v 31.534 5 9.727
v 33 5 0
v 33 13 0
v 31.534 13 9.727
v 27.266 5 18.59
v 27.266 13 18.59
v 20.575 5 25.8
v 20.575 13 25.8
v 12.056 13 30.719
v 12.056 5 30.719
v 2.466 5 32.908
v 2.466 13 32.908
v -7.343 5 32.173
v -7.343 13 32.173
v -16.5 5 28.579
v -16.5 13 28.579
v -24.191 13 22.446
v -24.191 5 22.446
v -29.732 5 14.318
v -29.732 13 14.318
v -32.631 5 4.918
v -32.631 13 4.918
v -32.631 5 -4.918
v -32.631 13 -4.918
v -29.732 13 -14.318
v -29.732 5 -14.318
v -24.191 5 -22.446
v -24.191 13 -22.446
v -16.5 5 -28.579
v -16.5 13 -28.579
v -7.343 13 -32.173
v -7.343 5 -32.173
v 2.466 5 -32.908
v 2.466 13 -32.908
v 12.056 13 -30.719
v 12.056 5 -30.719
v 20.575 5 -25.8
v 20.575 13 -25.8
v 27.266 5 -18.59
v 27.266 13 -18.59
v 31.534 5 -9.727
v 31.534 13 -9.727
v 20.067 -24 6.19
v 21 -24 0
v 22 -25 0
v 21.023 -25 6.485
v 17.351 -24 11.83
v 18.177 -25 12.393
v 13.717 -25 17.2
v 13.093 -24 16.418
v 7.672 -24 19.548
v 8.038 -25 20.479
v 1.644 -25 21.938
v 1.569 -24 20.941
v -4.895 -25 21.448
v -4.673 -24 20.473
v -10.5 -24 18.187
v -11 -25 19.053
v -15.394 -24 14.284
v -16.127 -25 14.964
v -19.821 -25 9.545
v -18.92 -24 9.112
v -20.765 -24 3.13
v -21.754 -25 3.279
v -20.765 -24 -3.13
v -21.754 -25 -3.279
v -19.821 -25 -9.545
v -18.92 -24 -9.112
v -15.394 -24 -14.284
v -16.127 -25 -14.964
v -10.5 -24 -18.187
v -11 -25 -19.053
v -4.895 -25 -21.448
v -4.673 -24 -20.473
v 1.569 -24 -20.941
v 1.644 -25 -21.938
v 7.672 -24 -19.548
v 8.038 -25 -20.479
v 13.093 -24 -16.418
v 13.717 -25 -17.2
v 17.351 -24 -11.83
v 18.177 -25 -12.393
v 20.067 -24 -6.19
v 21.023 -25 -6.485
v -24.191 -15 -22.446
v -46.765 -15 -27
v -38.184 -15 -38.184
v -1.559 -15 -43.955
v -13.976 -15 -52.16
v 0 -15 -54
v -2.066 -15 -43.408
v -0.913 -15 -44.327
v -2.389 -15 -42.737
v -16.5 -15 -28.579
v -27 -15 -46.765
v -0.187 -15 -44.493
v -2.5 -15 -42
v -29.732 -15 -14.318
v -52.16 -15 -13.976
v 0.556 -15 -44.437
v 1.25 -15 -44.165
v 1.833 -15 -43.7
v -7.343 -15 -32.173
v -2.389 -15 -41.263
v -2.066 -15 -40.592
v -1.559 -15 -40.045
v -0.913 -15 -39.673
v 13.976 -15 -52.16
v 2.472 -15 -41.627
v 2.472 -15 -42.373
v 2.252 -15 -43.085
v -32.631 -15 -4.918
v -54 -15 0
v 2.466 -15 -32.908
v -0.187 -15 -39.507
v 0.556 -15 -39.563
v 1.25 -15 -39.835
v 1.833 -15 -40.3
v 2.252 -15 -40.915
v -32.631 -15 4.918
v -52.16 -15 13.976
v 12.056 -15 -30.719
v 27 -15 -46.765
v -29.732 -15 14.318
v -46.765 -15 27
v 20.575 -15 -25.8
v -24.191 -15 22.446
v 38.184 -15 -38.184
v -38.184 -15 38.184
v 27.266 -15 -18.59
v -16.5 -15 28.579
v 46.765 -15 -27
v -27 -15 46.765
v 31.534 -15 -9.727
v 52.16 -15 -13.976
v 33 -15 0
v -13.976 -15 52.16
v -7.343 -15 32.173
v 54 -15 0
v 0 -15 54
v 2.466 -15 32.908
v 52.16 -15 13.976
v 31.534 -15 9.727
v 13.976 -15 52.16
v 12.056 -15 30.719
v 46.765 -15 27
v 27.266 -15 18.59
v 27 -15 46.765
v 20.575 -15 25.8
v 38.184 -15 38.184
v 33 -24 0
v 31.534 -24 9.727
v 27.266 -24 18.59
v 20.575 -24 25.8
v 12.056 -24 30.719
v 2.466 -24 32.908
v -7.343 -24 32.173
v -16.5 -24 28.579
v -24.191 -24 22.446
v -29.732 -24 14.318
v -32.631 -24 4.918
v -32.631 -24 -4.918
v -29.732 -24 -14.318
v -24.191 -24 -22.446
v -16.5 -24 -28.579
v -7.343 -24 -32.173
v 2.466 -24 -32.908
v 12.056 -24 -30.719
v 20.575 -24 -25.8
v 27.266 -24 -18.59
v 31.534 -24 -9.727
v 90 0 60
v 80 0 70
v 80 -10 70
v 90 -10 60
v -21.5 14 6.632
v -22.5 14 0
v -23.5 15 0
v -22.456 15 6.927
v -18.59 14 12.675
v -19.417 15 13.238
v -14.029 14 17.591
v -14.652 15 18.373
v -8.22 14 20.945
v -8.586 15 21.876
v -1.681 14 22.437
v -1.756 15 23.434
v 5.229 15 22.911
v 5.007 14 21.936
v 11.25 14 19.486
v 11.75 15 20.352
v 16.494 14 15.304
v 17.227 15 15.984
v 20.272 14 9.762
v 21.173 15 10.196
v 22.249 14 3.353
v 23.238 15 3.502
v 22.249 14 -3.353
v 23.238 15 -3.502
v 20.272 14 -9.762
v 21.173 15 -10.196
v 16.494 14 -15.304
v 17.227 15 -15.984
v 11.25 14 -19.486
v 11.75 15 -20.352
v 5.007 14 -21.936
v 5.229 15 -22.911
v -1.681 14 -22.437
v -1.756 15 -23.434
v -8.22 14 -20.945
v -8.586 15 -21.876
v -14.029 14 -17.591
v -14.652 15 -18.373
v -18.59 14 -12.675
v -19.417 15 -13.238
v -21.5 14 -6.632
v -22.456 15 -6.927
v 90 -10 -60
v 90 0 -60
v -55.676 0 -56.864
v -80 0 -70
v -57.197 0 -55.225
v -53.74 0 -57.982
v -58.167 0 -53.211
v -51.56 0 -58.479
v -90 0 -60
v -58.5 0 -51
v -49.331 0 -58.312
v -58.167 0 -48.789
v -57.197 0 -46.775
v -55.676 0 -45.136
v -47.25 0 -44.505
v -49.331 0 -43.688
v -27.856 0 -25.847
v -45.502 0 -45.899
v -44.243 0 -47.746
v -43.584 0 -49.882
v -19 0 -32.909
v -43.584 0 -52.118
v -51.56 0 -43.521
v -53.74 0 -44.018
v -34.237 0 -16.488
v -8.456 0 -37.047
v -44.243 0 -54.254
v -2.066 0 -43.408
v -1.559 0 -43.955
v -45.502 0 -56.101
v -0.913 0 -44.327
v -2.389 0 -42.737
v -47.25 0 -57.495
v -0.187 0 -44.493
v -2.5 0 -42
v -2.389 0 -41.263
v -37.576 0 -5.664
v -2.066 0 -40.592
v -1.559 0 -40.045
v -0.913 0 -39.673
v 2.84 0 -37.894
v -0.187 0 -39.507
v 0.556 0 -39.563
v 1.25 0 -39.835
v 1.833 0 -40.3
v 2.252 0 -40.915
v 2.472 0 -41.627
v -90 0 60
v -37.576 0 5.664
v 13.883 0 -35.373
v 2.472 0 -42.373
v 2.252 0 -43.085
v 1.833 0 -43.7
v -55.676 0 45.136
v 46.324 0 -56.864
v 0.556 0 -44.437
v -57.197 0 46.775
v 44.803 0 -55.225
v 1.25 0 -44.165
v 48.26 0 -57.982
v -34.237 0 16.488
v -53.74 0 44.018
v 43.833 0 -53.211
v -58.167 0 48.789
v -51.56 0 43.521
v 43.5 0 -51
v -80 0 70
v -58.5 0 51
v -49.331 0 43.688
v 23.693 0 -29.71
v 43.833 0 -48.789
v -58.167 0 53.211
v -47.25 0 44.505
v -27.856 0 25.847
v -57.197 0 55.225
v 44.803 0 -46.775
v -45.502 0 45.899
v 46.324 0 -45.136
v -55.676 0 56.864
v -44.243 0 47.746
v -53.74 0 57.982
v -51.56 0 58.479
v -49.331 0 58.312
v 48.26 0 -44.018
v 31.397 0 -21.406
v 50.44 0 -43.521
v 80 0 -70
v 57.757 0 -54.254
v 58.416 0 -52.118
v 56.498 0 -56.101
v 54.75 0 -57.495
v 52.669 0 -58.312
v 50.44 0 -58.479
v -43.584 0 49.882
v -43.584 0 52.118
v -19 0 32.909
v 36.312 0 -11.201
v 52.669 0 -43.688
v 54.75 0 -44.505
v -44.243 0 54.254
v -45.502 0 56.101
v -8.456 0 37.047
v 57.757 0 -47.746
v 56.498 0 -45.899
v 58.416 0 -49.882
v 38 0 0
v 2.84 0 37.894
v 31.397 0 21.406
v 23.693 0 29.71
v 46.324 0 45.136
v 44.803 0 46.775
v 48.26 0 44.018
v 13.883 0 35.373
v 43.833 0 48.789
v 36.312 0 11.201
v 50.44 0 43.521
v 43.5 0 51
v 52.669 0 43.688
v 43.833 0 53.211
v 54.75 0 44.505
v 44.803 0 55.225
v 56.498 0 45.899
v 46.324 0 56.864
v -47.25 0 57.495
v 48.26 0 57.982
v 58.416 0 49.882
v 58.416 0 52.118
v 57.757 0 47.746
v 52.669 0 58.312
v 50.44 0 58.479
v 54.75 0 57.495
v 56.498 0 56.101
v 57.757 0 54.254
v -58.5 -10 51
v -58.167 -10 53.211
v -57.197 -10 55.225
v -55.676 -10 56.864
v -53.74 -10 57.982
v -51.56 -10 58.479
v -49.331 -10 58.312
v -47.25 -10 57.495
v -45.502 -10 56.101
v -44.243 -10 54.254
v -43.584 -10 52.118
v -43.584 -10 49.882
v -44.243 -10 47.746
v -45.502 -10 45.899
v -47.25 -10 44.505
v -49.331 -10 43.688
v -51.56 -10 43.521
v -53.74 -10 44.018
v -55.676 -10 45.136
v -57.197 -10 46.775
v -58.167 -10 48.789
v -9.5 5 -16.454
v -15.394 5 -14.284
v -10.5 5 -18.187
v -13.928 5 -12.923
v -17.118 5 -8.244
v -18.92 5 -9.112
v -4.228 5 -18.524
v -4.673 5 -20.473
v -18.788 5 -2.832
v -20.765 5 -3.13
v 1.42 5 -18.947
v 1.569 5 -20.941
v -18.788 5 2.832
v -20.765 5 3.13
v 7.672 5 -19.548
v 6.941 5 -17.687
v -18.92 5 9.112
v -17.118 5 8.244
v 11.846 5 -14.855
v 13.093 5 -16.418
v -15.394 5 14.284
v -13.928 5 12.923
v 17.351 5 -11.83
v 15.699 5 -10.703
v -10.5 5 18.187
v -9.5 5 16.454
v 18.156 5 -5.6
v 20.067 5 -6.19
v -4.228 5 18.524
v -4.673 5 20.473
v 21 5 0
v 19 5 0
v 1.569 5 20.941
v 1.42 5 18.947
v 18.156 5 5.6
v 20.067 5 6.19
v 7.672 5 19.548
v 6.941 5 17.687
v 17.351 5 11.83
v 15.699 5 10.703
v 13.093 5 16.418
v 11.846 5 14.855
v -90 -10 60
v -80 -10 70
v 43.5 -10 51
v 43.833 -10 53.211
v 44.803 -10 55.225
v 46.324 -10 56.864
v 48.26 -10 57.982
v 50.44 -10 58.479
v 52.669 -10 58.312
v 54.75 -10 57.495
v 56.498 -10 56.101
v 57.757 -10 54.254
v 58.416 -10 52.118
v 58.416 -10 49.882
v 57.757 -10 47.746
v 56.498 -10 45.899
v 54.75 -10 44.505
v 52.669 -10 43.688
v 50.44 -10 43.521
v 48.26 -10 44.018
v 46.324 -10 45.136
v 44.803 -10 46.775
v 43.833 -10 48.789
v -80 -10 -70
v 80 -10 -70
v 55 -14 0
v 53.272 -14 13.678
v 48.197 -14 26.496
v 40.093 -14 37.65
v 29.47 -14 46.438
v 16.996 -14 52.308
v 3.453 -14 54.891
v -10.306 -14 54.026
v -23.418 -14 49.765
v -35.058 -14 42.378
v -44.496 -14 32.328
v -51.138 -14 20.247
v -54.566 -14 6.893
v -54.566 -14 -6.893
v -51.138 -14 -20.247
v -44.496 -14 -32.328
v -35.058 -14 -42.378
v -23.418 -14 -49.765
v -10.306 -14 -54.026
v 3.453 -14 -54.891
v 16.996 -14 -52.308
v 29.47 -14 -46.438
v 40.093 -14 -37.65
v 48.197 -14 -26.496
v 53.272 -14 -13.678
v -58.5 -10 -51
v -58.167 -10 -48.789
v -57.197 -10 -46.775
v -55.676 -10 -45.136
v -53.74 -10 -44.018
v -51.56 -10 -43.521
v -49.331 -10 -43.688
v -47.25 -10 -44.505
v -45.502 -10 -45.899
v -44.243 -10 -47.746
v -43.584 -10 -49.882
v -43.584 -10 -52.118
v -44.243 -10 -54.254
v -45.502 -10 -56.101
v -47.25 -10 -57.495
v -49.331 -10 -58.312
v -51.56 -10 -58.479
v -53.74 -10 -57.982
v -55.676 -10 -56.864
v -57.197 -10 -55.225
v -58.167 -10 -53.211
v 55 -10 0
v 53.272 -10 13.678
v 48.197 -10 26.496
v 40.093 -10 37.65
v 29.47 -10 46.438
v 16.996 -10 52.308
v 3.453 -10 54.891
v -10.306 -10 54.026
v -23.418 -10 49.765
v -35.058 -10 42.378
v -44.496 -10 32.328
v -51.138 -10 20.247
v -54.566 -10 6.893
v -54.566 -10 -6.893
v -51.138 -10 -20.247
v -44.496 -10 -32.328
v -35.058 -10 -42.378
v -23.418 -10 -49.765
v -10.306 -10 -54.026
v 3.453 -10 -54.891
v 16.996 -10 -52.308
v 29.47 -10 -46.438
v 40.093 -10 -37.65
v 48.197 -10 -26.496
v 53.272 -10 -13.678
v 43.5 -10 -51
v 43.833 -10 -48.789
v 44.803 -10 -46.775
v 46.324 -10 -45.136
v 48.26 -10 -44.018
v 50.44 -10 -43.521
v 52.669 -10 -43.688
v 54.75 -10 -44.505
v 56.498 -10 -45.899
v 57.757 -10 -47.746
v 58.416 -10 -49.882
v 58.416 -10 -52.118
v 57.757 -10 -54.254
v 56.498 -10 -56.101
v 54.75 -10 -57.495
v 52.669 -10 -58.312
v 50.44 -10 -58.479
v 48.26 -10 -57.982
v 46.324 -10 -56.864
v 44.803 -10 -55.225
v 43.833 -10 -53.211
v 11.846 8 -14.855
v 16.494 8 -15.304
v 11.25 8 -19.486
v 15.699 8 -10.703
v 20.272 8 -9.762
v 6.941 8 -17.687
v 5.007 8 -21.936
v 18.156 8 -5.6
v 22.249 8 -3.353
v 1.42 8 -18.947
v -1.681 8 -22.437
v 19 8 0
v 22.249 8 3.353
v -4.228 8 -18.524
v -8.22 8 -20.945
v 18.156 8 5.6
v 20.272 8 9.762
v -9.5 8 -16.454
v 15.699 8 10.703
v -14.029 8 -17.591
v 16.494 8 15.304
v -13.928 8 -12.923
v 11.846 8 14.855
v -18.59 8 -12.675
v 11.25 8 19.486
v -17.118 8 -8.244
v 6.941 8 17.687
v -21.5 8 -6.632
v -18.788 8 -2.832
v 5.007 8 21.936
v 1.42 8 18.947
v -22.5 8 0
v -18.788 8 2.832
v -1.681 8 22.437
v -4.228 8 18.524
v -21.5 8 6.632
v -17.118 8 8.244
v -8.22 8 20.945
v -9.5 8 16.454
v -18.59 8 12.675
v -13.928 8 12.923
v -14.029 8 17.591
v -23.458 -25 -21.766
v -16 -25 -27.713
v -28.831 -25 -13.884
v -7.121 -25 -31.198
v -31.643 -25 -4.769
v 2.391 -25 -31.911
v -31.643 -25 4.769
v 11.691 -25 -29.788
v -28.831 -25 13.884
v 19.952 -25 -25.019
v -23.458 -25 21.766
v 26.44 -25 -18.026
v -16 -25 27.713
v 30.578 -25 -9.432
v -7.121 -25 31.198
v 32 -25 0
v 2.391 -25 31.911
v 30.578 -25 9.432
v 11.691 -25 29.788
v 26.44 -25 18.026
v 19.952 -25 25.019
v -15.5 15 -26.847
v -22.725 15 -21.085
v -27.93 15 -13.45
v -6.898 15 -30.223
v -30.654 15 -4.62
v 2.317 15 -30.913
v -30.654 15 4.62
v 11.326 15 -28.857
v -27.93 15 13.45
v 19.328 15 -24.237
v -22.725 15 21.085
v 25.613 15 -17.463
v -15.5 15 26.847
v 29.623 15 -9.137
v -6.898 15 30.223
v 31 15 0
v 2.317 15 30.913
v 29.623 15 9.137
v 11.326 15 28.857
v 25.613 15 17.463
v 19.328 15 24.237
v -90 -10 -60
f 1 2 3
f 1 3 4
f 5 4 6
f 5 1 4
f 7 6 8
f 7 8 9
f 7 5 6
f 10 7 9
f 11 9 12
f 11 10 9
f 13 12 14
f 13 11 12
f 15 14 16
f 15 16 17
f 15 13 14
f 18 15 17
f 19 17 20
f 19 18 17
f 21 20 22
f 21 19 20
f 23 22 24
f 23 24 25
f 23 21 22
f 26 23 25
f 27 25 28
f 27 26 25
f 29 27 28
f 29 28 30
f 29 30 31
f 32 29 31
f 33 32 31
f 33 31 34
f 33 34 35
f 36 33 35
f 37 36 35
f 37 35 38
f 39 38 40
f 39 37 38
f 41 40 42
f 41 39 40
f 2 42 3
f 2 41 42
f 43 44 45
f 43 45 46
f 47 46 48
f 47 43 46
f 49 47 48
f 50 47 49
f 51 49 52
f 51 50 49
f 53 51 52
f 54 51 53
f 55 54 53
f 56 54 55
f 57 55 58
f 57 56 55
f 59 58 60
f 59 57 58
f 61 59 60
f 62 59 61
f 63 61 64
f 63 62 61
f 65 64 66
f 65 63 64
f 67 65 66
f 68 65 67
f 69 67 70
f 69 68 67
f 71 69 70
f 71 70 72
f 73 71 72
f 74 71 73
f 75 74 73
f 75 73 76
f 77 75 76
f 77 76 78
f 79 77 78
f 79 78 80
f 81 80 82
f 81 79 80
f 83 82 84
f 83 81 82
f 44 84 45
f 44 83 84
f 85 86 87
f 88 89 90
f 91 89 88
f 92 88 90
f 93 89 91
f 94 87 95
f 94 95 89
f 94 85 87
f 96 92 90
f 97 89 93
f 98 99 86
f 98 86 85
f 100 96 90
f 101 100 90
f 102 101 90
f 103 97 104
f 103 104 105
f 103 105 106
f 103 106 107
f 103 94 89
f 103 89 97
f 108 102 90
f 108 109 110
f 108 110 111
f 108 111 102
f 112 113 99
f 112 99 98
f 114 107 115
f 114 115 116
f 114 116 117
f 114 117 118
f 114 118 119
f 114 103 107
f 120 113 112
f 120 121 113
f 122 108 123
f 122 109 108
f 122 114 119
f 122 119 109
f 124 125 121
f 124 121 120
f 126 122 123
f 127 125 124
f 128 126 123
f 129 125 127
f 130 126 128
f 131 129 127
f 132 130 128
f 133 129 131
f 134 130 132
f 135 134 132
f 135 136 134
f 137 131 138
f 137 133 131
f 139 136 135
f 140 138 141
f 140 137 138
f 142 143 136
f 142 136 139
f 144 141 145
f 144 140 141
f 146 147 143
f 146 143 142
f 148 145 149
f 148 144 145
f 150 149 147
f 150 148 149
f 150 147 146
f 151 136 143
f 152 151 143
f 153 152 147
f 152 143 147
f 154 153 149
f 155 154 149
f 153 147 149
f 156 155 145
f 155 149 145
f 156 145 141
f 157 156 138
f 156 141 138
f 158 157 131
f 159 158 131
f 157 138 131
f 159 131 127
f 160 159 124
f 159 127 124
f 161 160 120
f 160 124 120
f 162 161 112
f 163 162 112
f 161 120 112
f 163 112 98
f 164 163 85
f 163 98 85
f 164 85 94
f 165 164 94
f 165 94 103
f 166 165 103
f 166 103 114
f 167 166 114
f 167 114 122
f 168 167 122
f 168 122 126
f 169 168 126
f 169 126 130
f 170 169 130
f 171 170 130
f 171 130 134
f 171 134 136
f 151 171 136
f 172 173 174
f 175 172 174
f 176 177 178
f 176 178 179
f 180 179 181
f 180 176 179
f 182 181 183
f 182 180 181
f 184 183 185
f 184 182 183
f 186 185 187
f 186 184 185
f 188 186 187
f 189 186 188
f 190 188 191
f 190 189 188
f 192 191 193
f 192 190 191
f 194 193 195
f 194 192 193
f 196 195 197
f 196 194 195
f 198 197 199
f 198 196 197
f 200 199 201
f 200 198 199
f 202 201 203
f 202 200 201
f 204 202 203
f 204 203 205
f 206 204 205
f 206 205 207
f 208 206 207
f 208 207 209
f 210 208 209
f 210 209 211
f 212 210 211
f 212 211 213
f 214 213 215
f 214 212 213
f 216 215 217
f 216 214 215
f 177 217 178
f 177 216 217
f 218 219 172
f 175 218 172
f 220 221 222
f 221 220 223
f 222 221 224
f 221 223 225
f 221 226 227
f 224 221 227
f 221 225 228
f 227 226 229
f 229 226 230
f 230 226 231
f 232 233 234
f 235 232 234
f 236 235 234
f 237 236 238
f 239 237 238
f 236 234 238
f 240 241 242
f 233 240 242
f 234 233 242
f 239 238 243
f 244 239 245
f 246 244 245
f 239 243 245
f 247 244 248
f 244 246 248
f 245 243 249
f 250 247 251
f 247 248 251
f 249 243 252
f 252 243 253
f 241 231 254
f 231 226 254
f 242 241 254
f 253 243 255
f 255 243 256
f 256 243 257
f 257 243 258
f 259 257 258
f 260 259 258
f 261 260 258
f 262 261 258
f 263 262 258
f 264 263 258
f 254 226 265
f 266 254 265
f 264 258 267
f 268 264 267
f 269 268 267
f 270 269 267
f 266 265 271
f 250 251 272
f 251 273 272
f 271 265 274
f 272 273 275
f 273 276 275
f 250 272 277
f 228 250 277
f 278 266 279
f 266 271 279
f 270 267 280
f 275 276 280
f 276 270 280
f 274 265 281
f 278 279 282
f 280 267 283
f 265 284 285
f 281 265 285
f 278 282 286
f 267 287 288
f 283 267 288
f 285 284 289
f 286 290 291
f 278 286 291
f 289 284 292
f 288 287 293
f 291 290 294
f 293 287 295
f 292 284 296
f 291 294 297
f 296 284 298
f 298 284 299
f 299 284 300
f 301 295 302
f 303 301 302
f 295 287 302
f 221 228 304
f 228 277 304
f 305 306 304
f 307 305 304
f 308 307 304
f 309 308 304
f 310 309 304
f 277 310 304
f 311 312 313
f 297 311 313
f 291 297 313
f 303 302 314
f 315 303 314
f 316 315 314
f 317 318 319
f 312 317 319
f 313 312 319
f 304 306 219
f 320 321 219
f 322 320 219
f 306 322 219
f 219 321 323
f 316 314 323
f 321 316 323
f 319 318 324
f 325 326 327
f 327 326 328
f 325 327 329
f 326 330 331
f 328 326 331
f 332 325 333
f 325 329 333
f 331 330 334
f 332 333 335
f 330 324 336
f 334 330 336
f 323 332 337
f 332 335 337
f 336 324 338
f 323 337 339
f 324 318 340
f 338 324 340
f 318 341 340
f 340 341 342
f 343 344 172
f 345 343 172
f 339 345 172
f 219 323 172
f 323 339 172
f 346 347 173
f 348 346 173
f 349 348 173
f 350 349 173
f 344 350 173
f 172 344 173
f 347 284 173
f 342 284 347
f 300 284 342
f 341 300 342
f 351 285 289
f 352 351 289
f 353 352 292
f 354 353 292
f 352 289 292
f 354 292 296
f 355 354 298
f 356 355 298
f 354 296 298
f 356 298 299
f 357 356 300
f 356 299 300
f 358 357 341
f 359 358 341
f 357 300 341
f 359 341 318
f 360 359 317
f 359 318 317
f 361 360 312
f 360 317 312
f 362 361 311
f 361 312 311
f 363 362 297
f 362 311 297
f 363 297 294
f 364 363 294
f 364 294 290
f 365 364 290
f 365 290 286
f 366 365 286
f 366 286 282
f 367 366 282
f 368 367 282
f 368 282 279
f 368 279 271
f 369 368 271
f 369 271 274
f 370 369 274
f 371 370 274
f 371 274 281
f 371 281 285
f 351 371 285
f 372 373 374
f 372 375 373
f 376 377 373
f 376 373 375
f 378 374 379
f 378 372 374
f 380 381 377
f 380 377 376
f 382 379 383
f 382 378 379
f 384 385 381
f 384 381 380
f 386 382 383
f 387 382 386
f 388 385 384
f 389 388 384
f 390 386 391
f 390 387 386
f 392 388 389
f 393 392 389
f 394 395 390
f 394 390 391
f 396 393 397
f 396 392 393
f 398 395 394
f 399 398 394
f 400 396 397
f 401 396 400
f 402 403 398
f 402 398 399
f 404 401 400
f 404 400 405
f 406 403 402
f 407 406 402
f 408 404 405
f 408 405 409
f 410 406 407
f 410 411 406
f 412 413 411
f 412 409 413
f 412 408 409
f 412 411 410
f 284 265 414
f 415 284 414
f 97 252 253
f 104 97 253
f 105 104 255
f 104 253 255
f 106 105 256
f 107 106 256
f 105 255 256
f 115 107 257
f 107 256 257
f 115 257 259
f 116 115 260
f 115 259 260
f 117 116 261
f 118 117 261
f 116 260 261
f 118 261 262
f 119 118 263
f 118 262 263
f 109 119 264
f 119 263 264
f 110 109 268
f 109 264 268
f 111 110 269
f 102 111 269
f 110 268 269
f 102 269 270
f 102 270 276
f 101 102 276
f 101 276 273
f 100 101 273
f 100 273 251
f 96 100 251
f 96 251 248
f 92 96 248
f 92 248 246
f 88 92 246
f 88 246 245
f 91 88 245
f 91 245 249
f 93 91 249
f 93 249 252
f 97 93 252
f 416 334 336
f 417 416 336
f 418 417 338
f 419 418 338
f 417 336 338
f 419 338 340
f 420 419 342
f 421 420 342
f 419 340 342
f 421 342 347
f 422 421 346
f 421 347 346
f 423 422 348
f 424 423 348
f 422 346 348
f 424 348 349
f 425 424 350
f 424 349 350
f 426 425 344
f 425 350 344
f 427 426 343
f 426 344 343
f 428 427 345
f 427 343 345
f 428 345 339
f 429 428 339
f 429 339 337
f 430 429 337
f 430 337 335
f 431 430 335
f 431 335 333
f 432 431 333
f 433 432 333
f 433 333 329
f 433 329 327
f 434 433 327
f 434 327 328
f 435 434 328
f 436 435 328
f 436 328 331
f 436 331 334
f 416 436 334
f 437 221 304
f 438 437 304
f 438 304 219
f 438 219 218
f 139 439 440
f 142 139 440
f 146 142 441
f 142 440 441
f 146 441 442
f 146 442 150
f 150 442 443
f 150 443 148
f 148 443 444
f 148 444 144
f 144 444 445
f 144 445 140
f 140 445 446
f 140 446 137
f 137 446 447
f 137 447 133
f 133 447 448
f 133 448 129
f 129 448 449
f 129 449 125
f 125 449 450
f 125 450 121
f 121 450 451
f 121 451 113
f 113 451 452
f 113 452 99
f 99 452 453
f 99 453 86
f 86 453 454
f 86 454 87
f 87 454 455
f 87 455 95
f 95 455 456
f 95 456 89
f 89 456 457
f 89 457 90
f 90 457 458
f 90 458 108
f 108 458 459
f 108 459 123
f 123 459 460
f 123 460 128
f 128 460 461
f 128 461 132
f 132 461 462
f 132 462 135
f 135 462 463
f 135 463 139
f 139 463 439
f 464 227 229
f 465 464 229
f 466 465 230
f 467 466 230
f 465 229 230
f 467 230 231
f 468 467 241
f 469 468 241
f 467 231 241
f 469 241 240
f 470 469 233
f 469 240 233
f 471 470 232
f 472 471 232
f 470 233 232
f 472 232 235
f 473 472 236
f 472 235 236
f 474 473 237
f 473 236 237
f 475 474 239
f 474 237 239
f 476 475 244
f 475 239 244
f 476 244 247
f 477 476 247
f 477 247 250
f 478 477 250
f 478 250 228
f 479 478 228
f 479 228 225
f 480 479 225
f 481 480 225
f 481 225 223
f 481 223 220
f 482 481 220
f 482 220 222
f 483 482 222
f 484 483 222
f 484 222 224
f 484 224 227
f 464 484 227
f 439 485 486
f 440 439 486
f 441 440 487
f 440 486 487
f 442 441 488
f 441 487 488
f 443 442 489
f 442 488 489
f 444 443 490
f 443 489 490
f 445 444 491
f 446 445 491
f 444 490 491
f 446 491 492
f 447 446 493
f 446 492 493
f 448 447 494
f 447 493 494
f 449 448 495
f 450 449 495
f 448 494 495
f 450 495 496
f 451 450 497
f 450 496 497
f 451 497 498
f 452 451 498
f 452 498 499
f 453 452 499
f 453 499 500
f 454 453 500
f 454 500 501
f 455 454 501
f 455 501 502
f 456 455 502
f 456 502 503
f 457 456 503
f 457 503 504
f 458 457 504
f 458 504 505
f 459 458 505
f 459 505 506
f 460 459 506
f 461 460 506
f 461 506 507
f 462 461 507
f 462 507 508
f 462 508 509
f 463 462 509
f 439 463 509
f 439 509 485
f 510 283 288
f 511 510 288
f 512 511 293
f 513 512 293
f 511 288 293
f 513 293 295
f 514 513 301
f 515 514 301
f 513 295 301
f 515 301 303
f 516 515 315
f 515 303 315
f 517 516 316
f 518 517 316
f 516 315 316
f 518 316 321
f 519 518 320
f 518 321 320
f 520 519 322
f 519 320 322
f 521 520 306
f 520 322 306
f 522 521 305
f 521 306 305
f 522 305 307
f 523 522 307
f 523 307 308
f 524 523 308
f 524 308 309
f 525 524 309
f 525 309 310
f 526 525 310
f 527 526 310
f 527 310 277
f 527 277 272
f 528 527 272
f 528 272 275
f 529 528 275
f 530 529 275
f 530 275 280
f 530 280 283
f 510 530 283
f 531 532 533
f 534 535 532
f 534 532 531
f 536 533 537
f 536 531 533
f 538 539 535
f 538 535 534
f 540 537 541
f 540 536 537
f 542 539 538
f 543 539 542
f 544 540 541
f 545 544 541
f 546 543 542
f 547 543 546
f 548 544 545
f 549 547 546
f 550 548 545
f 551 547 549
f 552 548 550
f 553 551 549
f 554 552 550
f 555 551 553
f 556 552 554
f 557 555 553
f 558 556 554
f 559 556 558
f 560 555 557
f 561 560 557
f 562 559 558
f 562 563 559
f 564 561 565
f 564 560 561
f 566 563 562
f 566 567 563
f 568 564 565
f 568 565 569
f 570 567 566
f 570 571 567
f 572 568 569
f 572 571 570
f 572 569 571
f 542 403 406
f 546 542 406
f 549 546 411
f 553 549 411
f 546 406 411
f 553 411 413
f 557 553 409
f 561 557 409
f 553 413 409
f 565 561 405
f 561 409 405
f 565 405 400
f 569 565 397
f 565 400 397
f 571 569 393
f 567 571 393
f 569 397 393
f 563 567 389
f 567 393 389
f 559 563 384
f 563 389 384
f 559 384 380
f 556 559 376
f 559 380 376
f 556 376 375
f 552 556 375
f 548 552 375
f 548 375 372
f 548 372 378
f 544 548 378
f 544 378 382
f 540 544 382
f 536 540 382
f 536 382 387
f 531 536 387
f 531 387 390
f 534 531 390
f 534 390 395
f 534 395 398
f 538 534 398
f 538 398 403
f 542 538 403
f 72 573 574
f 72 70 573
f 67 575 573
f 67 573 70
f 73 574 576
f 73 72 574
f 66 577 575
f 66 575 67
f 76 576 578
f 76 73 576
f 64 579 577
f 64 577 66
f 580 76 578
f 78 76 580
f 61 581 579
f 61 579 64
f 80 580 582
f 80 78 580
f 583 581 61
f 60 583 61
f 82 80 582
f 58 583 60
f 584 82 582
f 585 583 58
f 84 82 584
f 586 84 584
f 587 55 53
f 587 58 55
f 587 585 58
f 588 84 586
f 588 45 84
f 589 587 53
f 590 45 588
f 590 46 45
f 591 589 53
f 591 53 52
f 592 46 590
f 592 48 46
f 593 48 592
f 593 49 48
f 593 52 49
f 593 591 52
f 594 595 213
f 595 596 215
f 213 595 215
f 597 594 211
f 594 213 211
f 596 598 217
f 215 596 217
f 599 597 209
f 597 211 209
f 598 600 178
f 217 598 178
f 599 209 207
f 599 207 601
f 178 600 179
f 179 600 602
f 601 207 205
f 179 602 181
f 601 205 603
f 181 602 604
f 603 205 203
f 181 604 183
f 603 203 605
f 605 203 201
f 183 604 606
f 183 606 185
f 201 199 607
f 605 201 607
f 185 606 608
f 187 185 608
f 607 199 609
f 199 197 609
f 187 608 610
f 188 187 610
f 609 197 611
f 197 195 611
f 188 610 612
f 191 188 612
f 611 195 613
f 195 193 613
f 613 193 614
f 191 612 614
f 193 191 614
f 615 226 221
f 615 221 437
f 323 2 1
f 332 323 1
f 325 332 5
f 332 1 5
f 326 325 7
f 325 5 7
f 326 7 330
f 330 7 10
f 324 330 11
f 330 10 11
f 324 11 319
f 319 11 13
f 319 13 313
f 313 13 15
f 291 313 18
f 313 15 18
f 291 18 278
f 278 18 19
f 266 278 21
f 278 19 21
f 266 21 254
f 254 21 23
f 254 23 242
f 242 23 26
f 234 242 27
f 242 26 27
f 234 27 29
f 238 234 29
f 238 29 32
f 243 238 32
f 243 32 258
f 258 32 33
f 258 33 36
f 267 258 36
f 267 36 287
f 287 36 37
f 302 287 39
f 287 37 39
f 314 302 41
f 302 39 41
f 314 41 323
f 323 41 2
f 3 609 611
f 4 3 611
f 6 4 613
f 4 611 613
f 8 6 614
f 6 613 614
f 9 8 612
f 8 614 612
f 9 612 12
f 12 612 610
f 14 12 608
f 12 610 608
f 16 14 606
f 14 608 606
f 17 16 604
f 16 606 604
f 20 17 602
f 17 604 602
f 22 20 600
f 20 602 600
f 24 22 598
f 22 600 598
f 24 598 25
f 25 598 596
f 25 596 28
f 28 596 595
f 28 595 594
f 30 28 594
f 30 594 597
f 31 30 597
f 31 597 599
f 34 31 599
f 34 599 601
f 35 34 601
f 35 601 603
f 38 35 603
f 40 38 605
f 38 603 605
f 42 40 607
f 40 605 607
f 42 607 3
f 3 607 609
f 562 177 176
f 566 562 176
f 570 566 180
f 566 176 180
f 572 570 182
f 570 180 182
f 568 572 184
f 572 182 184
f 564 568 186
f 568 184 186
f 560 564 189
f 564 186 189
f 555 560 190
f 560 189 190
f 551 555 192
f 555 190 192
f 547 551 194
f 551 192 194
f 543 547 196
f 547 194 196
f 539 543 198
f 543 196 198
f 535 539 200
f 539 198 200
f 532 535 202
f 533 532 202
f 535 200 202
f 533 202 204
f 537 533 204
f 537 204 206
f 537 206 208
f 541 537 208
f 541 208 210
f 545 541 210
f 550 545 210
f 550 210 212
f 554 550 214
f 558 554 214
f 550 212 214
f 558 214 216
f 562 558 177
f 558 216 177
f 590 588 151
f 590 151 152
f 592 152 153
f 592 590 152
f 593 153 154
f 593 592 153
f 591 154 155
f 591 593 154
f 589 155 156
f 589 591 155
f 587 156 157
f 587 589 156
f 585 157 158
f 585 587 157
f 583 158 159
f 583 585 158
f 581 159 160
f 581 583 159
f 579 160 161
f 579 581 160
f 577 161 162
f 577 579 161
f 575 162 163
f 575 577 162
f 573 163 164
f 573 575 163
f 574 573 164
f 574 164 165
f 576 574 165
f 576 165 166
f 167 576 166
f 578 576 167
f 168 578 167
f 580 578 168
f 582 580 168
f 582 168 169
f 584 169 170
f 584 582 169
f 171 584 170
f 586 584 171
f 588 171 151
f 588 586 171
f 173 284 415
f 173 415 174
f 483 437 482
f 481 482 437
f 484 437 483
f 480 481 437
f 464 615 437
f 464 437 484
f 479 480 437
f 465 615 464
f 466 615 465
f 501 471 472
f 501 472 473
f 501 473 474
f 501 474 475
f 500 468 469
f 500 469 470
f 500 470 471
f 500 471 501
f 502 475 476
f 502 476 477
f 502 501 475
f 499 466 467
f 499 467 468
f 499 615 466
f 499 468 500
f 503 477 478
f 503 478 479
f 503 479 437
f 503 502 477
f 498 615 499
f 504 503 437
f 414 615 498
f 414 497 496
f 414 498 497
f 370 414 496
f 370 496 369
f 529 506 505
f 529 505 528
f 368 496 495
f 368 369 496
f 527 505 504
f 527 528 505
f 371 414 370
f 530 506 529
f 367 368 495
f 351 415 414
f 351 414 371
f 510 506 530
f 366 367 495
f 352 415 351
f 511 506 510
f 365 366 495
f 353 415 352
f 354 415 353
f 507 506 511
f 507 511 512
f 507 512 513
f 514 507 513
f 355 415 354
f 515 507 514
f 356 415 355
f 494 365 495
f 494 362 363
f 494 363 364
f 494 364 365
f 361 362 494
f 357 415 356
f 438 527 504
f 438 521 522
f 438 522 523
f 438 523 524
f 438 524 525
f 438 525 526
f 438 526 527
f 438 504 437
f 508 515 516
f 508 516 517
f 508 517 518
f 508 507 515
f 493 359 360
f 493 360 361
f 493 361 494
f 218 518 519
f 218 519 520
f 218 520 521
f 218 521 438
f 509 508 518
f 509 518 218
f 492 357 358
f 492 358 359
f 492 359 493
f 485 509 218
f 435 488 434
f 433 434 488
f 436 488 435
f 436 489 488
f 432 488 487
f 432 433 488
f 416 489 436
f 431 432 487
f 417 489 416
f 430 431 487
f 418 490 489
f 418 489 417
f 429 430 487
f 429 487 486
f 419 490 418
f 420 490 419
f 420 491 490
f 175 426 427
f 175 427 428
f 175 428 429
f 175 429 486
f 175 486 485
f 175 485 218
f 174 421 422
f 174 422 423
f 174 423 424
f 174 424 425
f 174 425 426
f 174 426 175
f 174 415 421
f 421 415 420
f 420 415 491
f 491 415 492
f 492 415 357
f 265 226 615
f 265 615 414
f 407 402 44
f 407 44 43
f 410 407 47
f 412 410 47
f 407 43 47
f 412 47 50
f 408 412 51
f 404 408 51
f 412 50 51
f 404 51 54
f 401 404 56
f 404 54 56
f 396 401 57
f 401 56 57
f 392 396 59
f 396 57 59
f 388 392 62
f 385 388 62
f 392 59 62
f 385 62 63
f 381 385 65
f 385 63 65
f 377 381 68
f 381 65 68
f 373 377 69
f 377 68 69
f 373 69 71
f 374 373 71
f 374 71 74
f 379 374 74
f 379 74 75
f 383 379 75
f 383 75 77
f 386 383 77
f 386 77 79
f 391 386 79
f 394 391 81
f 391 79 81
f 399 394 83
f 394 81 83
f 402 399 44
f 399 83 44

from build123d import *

# Parameters (mm, degrees)
F0_W          = 180
F0_H          = 140
F0_R          = 55
F1_DEPTH      = 10
F0_R_2        = 33
F2_DEPTH      = 15
F0_R_3        = 19
F3_DEPTH      = 25
F3_DEPTH_BACK = 15
F4_R          = 21
F4_R_2        = 19
F5_DEPTH      = 30
F6_R          = 22.5
F6_R_2        = 19
F7_DEPTH      = 7
F9_D          = 15
F11_D         = 5
F12_SIZE2     = 10
F12_SIZE      = 10
F13_SIZE2     = 5
F13_SIZE      = 5
F14_SIZE2     = 2
F14_SIZE      = 2
F15_SIZE2     = 1
F15_SIZE      = 1


with BuildPart() as f1:
    # F0 (on Front) → F1 (new body)
    with BuildSketch(Plane.XZ):
        Rectangle(F0_W, F0_H)
        Circle(F0_R, mode=Mode.SUBTRACT)
    extrude(amount=F1_DEPTH)

    # F0 (on Front) → F2 (join)
    with BuildSketch(Plane.XZ):
        Circle(F0_R)
        Circle(F0_R_2, mode=Mode.SUBTRACT)
    extrude(amount=F2_DEPTH)

    # F0 (on Front) → F3 (join, two sides)
    with BuildSketch(Plane.XZ) as f3_sk:
        Circle(F0_R_2)
        Circle(F0_R_3, mode=Mode.SUBTRACT)
    extrude(amount=F3_DEPTH)
    extrude(f3_sk.sketch, amount=-F3_DEPTH_BACK)

    # F4 (on face) → F5 (cut)
    with BuildSketch(Plane.XZ.offset(25)):
        Circle(F4_R)
        Circle(F4_R_2, mode=Mode.SUBTRACT)
    extrude(amount=-F5_DEPTH, mode=Mode.SUBTRACT)

    # F6 (on face) → F7 (cut)
    with BuildSketch(Plane(origin=(0, 15, 0), x_dir=(-1, 0, 0), z_dir=(0, 1, 0))):
        Circle(F6_R)
        Circle(F6_R_2, mode=Mode.SUBTRACT)
    extrude(amount=-F7_DEPTH, mode=Mode.SUBTRACT)

    # F9 (through all)
    with Locations(Plane.XZ.offset(10)):
        with Locations((-51, 51), (51, 51), (51, -51), (-51, -51)):
            Hole(F9_D / 2)

    # F11 (through all)
    with Locations(Plane.XZ.offset(15)):
        with Locations((0, -42)):
            Hole(F11_D / 2)

    # F12
    f12_edges = [f1.edges().sort_by_distance(p)[0] for p in [
        (-90, -5, 70),
        (-90, -5, -70),
        (90, -5, 70),
        (90, -5, -70),
    ]]
    chamfer(f12_edges, length=F12_SIZE, length2=F12_SIZE2)

    # F13
    f13_edges = [f1.edges().sort_by_distance(p)[0] for p in [
        (-33, 0, 0),
    ]]
    chamfer(f13_edges, length=F13_SIZE, length2=F13_SIZE2)

    # F14
    f14_edges = [f1.edges().sort_by_distance(p)[0] for p in [
        (-33, 15, 0),
    ]]
    chamfer(f14_edges, length=F14_SIZE, length2=F14_SIZE2)

    # F15
    f15_edges = [f1.edges().sort_by_distance(p)[0] for p in [
        (22.5, 15, 0),
        (-21, -25, 0),
        (-33, -25, 0),
        (-55, -15, 0),
    ]]
    chamfer(f15_edges, length=F15_SIZE, length2=F15_SIZE2)


solid = f1.part
